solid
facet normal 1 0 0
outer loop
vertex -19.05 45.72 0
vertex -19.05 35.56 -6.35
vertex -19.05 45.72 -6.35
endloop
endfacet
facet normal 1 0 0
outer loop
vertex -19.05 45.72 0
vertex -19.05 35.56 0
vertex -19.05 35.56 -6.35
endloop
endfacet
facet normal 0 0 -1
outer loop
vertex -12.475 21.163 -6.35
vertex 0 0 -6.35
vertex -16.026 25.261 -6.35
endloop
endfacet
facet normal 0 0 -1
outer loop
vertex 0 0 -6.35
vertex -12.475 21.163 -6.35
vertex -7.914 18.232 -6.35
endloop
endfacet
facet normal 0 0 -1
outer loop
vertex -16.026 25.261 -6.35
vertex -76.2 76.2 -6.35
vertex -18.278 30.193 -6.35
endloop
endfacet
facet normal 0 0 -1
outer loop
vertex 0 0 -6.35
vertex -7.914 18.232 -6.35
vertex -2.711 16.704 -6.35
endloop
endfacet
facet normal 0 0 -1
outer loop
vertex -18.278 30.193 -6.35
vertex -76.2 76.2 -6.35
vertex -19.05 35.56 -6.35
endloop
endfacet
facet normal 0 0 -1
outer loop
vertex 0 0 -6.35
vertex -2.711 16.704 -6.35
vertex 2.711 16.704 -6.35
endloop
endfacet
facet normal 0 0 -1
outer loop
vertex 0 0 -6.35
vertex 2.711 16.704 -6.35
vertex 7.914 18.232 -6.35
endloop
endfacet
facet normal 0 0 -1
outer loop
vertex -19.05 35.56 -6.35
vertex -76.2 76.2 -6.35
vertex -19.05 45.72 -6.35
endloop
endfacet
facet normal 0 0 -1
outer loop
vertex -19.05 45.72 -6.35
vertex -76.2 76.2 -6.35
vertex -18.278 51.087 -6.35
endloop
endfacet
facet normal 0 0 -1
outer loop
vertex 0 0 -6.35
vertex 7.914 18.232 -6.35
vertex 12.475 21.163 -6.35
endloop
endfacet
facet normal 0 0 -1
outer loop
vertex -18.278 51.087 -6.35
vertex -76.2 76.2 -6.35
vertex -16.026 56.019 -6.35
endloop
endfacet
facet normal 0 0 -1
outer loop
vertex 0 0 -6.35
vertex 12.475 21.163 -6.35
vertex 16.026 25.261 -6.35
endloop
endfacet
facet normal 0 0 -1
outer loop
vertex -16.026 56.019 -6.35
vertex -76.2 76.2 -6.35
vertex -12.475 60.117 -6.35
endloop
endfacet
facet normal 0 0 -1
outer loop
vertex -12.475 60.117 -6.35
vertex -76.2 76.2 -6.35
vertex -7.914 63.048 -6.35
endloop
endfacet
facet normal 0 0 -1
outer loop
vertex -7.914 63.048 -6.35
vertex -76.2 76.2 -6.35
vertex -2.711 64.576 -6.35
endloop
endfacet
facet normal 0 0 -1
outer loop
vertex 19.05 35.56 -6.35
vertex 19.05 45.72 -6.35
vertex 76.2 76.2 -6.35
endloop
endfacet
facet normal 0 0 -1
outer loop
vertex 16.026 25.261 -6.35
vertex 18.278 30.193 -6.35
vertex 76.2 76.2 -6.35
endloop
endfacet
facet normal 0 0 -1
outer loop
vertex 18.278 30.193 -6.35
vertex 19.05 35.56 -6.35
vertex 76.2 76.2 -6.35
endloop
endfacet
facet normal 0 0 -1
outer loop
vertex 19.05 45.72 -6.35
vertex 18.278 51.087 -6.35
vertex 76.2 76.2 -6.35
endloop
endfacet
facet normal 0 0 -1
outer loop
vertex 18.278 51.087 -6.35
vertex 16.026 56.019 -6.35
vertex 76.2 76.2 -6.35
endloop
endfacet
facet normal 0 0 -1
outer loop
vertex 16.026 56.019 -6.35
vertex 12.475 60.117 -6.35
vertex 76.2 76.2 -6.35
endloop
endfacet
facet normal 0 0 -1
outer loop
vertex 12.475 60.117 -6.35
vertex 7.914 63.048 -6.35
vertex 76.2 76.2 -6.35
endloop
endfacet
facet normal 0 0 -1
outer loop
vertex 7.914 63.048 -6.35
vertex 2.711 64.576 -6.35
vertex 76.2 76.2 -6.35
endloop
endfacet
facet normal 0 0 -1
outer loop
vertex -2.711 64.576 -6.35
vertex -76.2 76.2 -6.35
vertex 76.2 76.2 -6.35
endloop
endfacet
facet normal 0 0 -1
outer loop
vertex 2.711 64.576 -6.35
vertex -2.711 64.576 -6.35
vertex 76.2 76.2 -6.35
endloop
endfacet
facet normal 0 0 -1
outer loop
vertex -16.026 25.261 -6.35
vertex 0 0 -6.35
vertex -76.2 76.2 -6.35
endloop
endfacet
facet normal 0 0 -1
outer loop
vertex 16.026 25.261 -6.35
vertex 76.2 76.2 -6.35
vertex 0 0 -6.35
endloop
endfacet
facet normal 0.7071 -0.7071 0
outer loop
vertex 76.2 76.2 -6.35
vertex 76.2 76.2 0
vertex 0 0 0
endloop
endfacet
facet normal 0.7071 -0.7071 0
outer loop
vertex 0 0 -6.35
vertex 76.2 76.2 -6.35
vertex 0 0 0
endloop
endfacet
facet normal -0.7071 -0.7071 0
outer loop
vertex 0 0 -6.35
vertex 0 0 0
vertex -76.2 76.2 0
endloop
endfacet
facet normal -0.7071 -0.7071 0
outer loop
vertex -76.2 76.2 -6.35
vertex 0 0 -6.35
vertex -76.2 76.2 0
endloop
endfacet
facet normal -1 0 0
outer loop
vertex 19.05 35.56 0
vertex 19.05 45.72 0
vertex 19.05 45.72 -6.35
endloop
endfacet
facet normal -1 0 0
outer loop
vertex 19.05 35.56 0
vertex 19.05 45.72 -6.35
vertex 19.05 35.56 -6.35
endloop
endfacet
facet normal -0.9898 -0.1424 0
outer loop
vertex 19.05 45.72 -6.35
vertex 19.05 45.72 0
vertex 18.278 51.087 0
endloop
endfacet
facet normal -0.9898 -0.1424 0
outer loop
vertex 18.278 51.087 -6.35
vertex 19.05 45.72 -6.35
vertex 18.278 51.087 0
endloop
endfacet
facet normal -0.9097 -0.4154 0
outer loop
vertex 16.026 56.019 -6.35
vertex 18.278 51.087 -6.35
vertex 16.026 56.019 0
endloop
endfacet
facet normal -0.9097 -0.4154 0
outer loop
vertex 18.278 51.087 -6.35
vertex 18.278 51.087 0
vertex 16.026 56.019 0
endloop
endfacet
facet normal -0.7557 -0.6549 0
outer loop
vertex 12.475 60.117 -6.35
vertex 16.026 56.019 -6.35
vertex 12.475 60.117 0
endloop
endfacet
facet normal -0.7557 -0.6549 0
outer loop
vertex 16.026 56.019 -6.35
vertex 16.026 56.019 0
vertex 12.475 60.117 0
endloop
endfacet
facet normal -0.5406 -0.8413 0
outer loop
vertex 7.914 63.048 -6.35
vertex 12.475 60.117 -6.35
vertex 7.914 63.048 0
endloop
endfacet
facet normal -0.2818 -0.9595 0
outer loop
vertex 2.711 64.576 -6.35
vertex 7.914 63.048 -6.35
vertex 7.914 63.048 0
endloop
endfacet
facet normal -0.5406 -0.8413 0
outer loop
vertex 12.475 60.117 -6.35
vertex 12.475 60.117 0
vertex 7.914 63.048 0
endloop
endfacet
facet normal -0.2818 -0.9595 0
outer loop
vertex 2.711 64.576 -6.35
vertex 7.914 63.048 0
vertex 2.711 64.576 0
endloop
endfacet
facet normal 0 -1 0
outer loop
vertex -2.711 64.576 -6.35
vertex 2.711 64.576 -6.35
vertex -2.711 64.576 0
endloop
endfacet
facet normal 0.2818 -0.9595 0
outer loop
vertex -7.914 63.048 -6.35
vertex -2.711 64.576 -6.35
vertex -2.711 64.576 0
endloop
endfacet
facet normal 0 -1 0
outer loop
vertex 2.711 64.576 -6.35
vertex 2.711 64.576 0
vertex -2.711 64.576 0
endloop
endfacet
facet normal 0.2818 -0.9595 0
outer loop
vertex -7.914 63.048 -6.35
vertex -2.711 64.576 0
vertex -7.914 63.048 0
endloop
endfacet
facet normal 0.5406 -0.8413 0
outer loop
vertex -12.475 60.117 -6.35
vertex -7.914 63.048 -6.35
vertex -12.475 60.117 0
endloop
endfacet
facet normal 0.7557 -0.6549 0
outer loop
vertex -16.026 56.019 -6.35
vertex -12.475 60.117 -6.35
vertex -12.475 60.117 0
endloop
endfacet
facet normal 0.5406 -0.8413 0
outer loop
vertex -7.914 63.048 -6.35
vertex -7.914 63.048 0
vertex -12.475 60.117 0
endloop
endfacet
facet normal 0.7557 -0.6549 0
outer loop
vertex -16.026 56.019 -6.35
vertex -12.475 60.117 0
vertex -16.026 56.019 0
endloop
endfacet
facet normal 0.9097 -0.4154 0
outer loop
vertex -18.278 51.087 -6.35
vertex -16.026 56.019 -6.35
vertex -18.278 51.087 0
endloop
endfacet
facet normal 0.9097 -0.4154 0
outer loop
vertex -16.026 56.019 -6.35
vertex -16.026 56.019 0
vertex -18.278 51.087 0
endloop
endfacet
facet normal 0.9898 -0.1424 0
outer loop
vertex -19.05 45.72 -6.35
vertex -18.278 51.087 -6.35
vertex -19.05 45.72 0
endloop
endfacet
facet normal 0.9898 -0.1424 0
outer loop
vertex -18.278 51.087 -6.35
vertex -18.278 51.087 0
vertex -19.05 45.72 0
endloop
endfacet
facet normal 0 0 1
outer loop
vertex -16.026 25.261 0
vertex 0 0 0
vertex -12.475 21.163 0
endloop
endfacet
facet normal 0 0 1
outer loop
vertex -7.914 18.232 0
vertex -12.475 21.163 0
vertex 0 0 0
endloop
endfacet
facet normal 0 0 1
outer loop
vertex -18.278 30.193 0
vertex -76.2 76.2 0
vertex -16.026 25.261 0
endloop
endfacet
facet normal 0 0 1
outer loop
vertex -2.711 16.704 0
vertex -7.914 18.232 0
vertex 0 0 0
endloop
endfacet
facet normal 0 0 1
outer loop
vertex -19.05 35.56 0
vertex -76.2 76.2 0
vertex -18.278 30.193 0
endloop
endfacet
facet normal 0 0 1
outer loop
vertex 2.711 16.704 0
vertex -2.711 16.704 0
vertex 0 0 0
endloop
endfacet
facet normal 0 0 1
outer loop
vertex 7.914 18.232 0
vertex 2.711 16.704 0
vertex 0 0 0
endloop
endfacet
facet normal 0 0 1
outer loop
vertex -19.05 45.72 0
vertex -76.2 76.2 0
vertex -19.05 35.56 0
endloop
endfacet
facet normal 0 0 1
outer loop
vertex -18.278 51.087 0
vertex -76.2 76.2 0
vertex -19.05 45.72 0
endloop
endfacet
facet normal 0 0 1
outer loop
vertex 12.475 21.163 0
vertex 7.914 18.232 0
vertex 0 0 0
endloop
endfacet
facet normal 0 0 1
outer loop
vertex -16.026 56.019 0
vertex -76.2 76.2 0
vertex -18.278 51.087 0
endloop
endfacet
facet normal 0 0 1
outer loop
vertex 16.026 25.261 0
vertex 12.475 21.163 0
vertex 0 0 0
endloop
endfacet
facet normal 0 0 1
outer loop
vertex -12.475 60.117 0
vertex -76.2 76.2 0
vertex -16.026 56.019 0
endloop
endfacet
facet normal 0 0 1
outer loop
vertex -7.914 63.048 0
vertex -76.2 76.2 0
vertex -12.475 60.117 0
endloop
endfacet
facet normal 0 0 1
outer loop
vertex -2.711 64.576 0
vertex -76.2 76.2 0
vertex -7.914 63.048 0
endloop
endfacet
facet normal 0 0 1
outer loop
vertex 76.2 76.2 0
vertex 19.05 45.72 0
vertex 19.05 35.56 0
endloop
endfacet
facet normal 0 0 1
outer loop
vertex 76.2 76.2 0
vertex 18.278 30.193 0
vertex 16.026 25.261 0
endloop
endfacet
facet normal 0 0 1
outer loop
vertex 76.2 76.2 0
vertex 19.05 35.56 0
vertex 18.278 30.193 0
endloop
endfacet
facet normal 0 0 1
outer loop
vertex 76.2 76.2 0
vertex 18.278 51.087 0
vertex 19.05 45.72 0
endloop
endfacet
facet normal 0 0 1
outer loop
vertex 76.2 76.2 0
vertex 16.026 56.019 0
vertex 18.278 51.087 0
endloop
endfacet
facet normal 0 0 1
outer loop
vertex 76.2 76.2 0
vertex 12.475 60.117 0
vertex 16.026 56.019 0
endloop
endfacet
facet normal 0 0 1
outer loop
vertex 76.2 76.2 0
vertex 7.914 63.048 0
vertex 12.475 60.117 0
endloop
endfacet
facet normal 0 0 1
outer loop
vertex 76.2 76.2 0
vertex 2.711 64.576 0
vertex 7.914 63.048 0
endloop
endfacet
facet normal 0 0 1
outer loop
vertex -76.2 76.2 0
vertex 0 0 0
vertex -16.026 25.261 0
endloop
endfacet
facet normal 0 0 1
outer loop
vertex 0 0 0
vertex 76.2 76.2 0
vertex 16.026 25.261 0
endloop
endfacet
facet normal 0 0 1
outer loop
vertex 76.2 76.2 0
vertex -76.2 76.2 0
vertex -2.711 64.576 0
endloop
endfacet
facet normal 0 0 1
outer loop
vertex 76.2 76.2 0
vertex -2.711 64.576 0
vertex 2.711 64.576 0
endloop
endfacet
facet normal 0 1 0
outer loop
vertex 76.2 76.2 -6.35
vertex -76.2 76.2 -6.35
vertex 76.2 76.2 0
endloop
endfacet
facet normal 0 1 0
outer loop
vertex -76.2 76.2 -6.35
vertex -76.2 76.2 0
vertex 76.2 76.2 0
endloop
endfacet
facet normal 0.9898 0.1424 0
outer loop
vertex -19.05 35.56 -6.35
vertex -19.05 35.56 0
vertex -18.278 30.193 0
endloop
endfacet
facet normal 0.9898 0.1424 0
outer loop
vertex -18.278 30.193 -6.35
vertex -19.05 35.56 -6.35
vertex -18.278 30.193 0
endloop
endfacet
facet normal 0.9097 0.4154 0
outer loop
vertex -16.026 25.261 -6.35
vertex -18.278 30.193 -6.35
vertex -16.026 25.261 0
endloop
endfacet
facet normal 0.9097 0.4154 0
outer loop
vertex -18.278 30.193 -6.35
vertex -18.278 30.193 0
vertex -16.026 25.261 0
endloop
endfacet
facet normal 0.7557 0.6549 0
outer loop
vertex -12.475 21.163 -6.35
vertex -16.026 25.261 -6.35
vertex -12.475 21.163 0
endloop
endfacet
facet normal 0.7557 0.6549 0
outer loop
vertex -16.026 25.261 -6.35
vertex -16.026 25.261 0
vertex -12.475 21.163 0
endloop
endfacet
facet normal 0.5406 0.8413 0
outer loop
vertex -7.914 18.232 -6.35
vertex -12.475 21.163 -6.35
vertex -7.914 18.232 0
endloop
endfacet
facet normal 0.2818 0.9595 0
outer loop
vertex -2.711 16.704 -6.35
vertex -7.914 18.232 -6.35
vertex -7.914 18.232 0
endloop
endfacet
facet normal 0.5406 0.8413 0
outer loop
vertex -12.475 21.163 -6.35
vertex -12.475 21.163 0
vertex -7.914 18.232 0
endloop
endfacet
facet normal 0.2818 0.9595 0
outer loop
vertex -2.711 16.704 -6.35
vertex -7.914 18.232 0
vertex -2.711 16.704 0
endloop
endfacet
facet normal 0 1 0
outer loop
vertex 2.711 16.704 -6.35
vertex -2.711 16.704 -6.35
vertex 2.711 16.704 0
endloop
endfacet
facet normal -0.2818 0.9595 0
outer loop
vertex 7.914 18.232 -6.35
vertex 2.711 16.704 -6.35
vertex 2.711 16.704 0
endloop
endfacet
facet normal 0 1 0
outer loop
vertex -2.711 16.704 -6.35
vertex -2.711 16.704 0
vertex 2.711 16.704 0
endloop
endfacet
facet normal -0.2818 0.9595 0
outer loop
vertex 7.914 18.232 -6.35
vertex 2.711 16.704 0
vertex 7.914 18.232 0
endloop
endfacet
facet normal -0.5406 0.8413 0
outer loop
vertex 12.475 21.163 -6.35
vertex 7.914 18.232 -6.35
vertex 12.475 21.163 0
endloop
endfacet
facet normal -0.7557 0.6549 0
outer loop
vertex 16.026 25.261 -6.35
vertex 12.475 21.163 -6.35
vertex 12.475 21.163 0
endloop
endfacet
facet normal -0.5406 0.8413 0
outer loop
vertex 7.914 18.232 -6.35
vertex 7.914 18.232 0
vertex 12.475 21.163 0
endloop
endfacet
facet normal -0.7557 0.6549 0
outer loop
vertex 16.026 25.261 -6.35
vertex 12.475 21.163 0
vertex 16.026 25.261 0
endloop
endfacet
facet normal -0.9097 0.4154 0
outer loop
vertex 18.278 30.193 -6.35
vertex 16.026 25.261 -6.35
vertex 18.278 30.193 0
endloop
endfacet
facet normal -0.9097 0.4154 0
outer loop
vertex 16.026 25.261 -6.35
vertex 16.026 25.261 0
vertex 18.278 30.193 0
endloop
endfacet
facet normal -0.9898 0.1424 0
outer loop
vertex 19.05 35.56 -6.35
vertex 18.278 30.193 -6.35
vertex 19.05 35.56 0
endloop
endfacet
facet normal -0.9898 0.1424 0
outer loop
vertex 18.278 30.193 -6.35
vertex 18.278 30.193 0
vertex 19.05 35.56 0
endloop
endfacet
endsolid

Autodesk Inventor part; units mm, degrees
ref_plane "YZ Plane" through (0, 0, 0) normal (1, 0, 0) x (0, 1, 0)
ref_plane "XZ Plane" through (0, 0, 0) normal (0, 1, 0) x (-1, 0, 0)
ref_plane "XY Plane" through (0, 0, 0) normal (0, 0, 1) x (1, 0, 0)
sketch "Sketch1" plane through (0, 0, 0) normal (0, 0, 1) x (1, 0, 0)
  line L0 (0, 0) -> (-76.2, 76.2)
  line L1 (-76.2, 76.2) -> (76.2, 76.2)
  line L2 (76.2, 76.2) -> (0, 0)
  point P0 (0, 76.2)
  dimension "d0" = 152.4
  dimension "d2" = 76.2
extrude "Extrusion1" add sketch "Sketch1" against normal blind 6.35
sketch "Sketch2" plane through (0, 0, 0) normal (0, 0, 1) x (1, 0, 0)
  line L0 (-76.2, 76.2) -> (76.2, 76.2) projected
  line L1 (-19.05, 35.56) -> (-19.05, 45.72)
  arc A0 (19.05, 45.72) -> (-19.05, 45.72) centre (0, 45.72) ccw
  line L2 (19.05, 45.72) -> (19.05, 35.56)
  arc A1 (-19.05, 35.56) -> (19.05, 35.56) centre (0, 35.56) ccw
  point P0 (0, 76.2)
  dimension "d5" = 10.16
  dimension "d6" = 19.05
  dimension "d7" = 30.48
extrude "Extrusion2" cut sketch "Sketch2" against normal through all
ref_plane "Work Plane1" through (76.2, 76.2, -3.175) normal (0, 0, -1) x (-1, 0, 0)
properties part number "GE-13020-02" material "Steel"
